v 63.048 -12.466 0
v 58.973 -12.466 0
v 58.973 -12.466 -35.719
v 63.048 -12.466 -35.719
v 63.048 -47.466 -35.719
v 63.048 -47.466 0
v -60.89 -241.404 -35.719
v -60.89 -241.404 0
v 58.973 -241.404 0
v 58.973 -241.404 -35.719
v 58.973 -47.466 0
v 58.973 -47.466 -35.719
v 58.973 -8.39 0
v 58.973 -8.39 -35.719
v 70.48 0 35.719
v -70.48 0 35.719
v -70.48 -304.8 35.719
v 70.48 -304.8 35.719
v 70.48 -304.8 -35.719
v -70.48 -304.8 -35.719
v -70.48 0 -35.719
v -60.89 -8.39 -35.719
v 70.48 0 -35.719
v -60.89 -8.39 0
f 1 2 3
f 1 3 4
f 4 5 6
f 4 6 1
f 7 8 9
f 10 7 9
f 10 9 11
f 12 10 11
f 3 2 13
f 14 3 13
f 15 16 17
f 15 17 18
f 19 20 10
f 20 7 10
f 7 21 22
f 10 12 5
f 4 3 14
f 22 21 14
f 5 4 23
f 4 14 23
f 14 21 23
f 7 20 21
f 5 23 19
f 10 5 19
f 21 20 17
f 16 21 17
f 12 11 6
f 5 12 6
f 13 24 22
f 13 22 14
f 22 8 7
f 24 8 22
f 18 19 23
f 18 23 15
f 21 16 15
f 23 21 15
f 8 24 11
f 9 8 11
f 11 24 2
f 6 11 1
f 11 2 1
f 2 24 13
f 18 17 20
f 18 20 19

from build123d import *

# Parameters (mm, degrees)
F0_W     = 140.959114
F0_H     = 71.438462
F1_DEPTH = 304.8
F2_W     = 119.863194
F2_H     = 233.014038
F3_DEPTH = 152.4
F4_W     = 35.95896
F4_H     = 35.000048
F5_DEPTH = 254
F6_R     = 11.870693
F7_DEPTH = 304.8


with BuildPart() as f1:
    # F0 (on Front) → F1 (new body)
    with BuildSketch(Plane.XZ):
        Rectangle(F0_W, F0_H)
    extrude(amount=F1_DEPTH)

    # F2 (on Top) → F3 (cut)
    with BuildSketch(Plane.XY):
        with Locations((-0.958899, -124.89744)):
            Rectangle(F2_W, F2_H)
    extrude(amount=-F3_DEPTH, mode=Mode.SUBTRACT)

    # F4 (on Top) → F5 (cut)
    with BuildSketch(Plane.XY):
        with Locations((45.068562, -29.9658)):
            Rectangle(F4_W, F4_H)
    extrude(amount=-F5_DEPTH, mode=Mode.SUBTRACT)

    # F6 (on Front) → F7 (cut)
    with BuildSketch(Plane.XZ):
        with Locations((-40.513758, 16.780848)):
            Circle(F6_R)
    extrude(amount=-F7_DEPTH, mode=Mode.SUBTRACT)


solid = f1.part
